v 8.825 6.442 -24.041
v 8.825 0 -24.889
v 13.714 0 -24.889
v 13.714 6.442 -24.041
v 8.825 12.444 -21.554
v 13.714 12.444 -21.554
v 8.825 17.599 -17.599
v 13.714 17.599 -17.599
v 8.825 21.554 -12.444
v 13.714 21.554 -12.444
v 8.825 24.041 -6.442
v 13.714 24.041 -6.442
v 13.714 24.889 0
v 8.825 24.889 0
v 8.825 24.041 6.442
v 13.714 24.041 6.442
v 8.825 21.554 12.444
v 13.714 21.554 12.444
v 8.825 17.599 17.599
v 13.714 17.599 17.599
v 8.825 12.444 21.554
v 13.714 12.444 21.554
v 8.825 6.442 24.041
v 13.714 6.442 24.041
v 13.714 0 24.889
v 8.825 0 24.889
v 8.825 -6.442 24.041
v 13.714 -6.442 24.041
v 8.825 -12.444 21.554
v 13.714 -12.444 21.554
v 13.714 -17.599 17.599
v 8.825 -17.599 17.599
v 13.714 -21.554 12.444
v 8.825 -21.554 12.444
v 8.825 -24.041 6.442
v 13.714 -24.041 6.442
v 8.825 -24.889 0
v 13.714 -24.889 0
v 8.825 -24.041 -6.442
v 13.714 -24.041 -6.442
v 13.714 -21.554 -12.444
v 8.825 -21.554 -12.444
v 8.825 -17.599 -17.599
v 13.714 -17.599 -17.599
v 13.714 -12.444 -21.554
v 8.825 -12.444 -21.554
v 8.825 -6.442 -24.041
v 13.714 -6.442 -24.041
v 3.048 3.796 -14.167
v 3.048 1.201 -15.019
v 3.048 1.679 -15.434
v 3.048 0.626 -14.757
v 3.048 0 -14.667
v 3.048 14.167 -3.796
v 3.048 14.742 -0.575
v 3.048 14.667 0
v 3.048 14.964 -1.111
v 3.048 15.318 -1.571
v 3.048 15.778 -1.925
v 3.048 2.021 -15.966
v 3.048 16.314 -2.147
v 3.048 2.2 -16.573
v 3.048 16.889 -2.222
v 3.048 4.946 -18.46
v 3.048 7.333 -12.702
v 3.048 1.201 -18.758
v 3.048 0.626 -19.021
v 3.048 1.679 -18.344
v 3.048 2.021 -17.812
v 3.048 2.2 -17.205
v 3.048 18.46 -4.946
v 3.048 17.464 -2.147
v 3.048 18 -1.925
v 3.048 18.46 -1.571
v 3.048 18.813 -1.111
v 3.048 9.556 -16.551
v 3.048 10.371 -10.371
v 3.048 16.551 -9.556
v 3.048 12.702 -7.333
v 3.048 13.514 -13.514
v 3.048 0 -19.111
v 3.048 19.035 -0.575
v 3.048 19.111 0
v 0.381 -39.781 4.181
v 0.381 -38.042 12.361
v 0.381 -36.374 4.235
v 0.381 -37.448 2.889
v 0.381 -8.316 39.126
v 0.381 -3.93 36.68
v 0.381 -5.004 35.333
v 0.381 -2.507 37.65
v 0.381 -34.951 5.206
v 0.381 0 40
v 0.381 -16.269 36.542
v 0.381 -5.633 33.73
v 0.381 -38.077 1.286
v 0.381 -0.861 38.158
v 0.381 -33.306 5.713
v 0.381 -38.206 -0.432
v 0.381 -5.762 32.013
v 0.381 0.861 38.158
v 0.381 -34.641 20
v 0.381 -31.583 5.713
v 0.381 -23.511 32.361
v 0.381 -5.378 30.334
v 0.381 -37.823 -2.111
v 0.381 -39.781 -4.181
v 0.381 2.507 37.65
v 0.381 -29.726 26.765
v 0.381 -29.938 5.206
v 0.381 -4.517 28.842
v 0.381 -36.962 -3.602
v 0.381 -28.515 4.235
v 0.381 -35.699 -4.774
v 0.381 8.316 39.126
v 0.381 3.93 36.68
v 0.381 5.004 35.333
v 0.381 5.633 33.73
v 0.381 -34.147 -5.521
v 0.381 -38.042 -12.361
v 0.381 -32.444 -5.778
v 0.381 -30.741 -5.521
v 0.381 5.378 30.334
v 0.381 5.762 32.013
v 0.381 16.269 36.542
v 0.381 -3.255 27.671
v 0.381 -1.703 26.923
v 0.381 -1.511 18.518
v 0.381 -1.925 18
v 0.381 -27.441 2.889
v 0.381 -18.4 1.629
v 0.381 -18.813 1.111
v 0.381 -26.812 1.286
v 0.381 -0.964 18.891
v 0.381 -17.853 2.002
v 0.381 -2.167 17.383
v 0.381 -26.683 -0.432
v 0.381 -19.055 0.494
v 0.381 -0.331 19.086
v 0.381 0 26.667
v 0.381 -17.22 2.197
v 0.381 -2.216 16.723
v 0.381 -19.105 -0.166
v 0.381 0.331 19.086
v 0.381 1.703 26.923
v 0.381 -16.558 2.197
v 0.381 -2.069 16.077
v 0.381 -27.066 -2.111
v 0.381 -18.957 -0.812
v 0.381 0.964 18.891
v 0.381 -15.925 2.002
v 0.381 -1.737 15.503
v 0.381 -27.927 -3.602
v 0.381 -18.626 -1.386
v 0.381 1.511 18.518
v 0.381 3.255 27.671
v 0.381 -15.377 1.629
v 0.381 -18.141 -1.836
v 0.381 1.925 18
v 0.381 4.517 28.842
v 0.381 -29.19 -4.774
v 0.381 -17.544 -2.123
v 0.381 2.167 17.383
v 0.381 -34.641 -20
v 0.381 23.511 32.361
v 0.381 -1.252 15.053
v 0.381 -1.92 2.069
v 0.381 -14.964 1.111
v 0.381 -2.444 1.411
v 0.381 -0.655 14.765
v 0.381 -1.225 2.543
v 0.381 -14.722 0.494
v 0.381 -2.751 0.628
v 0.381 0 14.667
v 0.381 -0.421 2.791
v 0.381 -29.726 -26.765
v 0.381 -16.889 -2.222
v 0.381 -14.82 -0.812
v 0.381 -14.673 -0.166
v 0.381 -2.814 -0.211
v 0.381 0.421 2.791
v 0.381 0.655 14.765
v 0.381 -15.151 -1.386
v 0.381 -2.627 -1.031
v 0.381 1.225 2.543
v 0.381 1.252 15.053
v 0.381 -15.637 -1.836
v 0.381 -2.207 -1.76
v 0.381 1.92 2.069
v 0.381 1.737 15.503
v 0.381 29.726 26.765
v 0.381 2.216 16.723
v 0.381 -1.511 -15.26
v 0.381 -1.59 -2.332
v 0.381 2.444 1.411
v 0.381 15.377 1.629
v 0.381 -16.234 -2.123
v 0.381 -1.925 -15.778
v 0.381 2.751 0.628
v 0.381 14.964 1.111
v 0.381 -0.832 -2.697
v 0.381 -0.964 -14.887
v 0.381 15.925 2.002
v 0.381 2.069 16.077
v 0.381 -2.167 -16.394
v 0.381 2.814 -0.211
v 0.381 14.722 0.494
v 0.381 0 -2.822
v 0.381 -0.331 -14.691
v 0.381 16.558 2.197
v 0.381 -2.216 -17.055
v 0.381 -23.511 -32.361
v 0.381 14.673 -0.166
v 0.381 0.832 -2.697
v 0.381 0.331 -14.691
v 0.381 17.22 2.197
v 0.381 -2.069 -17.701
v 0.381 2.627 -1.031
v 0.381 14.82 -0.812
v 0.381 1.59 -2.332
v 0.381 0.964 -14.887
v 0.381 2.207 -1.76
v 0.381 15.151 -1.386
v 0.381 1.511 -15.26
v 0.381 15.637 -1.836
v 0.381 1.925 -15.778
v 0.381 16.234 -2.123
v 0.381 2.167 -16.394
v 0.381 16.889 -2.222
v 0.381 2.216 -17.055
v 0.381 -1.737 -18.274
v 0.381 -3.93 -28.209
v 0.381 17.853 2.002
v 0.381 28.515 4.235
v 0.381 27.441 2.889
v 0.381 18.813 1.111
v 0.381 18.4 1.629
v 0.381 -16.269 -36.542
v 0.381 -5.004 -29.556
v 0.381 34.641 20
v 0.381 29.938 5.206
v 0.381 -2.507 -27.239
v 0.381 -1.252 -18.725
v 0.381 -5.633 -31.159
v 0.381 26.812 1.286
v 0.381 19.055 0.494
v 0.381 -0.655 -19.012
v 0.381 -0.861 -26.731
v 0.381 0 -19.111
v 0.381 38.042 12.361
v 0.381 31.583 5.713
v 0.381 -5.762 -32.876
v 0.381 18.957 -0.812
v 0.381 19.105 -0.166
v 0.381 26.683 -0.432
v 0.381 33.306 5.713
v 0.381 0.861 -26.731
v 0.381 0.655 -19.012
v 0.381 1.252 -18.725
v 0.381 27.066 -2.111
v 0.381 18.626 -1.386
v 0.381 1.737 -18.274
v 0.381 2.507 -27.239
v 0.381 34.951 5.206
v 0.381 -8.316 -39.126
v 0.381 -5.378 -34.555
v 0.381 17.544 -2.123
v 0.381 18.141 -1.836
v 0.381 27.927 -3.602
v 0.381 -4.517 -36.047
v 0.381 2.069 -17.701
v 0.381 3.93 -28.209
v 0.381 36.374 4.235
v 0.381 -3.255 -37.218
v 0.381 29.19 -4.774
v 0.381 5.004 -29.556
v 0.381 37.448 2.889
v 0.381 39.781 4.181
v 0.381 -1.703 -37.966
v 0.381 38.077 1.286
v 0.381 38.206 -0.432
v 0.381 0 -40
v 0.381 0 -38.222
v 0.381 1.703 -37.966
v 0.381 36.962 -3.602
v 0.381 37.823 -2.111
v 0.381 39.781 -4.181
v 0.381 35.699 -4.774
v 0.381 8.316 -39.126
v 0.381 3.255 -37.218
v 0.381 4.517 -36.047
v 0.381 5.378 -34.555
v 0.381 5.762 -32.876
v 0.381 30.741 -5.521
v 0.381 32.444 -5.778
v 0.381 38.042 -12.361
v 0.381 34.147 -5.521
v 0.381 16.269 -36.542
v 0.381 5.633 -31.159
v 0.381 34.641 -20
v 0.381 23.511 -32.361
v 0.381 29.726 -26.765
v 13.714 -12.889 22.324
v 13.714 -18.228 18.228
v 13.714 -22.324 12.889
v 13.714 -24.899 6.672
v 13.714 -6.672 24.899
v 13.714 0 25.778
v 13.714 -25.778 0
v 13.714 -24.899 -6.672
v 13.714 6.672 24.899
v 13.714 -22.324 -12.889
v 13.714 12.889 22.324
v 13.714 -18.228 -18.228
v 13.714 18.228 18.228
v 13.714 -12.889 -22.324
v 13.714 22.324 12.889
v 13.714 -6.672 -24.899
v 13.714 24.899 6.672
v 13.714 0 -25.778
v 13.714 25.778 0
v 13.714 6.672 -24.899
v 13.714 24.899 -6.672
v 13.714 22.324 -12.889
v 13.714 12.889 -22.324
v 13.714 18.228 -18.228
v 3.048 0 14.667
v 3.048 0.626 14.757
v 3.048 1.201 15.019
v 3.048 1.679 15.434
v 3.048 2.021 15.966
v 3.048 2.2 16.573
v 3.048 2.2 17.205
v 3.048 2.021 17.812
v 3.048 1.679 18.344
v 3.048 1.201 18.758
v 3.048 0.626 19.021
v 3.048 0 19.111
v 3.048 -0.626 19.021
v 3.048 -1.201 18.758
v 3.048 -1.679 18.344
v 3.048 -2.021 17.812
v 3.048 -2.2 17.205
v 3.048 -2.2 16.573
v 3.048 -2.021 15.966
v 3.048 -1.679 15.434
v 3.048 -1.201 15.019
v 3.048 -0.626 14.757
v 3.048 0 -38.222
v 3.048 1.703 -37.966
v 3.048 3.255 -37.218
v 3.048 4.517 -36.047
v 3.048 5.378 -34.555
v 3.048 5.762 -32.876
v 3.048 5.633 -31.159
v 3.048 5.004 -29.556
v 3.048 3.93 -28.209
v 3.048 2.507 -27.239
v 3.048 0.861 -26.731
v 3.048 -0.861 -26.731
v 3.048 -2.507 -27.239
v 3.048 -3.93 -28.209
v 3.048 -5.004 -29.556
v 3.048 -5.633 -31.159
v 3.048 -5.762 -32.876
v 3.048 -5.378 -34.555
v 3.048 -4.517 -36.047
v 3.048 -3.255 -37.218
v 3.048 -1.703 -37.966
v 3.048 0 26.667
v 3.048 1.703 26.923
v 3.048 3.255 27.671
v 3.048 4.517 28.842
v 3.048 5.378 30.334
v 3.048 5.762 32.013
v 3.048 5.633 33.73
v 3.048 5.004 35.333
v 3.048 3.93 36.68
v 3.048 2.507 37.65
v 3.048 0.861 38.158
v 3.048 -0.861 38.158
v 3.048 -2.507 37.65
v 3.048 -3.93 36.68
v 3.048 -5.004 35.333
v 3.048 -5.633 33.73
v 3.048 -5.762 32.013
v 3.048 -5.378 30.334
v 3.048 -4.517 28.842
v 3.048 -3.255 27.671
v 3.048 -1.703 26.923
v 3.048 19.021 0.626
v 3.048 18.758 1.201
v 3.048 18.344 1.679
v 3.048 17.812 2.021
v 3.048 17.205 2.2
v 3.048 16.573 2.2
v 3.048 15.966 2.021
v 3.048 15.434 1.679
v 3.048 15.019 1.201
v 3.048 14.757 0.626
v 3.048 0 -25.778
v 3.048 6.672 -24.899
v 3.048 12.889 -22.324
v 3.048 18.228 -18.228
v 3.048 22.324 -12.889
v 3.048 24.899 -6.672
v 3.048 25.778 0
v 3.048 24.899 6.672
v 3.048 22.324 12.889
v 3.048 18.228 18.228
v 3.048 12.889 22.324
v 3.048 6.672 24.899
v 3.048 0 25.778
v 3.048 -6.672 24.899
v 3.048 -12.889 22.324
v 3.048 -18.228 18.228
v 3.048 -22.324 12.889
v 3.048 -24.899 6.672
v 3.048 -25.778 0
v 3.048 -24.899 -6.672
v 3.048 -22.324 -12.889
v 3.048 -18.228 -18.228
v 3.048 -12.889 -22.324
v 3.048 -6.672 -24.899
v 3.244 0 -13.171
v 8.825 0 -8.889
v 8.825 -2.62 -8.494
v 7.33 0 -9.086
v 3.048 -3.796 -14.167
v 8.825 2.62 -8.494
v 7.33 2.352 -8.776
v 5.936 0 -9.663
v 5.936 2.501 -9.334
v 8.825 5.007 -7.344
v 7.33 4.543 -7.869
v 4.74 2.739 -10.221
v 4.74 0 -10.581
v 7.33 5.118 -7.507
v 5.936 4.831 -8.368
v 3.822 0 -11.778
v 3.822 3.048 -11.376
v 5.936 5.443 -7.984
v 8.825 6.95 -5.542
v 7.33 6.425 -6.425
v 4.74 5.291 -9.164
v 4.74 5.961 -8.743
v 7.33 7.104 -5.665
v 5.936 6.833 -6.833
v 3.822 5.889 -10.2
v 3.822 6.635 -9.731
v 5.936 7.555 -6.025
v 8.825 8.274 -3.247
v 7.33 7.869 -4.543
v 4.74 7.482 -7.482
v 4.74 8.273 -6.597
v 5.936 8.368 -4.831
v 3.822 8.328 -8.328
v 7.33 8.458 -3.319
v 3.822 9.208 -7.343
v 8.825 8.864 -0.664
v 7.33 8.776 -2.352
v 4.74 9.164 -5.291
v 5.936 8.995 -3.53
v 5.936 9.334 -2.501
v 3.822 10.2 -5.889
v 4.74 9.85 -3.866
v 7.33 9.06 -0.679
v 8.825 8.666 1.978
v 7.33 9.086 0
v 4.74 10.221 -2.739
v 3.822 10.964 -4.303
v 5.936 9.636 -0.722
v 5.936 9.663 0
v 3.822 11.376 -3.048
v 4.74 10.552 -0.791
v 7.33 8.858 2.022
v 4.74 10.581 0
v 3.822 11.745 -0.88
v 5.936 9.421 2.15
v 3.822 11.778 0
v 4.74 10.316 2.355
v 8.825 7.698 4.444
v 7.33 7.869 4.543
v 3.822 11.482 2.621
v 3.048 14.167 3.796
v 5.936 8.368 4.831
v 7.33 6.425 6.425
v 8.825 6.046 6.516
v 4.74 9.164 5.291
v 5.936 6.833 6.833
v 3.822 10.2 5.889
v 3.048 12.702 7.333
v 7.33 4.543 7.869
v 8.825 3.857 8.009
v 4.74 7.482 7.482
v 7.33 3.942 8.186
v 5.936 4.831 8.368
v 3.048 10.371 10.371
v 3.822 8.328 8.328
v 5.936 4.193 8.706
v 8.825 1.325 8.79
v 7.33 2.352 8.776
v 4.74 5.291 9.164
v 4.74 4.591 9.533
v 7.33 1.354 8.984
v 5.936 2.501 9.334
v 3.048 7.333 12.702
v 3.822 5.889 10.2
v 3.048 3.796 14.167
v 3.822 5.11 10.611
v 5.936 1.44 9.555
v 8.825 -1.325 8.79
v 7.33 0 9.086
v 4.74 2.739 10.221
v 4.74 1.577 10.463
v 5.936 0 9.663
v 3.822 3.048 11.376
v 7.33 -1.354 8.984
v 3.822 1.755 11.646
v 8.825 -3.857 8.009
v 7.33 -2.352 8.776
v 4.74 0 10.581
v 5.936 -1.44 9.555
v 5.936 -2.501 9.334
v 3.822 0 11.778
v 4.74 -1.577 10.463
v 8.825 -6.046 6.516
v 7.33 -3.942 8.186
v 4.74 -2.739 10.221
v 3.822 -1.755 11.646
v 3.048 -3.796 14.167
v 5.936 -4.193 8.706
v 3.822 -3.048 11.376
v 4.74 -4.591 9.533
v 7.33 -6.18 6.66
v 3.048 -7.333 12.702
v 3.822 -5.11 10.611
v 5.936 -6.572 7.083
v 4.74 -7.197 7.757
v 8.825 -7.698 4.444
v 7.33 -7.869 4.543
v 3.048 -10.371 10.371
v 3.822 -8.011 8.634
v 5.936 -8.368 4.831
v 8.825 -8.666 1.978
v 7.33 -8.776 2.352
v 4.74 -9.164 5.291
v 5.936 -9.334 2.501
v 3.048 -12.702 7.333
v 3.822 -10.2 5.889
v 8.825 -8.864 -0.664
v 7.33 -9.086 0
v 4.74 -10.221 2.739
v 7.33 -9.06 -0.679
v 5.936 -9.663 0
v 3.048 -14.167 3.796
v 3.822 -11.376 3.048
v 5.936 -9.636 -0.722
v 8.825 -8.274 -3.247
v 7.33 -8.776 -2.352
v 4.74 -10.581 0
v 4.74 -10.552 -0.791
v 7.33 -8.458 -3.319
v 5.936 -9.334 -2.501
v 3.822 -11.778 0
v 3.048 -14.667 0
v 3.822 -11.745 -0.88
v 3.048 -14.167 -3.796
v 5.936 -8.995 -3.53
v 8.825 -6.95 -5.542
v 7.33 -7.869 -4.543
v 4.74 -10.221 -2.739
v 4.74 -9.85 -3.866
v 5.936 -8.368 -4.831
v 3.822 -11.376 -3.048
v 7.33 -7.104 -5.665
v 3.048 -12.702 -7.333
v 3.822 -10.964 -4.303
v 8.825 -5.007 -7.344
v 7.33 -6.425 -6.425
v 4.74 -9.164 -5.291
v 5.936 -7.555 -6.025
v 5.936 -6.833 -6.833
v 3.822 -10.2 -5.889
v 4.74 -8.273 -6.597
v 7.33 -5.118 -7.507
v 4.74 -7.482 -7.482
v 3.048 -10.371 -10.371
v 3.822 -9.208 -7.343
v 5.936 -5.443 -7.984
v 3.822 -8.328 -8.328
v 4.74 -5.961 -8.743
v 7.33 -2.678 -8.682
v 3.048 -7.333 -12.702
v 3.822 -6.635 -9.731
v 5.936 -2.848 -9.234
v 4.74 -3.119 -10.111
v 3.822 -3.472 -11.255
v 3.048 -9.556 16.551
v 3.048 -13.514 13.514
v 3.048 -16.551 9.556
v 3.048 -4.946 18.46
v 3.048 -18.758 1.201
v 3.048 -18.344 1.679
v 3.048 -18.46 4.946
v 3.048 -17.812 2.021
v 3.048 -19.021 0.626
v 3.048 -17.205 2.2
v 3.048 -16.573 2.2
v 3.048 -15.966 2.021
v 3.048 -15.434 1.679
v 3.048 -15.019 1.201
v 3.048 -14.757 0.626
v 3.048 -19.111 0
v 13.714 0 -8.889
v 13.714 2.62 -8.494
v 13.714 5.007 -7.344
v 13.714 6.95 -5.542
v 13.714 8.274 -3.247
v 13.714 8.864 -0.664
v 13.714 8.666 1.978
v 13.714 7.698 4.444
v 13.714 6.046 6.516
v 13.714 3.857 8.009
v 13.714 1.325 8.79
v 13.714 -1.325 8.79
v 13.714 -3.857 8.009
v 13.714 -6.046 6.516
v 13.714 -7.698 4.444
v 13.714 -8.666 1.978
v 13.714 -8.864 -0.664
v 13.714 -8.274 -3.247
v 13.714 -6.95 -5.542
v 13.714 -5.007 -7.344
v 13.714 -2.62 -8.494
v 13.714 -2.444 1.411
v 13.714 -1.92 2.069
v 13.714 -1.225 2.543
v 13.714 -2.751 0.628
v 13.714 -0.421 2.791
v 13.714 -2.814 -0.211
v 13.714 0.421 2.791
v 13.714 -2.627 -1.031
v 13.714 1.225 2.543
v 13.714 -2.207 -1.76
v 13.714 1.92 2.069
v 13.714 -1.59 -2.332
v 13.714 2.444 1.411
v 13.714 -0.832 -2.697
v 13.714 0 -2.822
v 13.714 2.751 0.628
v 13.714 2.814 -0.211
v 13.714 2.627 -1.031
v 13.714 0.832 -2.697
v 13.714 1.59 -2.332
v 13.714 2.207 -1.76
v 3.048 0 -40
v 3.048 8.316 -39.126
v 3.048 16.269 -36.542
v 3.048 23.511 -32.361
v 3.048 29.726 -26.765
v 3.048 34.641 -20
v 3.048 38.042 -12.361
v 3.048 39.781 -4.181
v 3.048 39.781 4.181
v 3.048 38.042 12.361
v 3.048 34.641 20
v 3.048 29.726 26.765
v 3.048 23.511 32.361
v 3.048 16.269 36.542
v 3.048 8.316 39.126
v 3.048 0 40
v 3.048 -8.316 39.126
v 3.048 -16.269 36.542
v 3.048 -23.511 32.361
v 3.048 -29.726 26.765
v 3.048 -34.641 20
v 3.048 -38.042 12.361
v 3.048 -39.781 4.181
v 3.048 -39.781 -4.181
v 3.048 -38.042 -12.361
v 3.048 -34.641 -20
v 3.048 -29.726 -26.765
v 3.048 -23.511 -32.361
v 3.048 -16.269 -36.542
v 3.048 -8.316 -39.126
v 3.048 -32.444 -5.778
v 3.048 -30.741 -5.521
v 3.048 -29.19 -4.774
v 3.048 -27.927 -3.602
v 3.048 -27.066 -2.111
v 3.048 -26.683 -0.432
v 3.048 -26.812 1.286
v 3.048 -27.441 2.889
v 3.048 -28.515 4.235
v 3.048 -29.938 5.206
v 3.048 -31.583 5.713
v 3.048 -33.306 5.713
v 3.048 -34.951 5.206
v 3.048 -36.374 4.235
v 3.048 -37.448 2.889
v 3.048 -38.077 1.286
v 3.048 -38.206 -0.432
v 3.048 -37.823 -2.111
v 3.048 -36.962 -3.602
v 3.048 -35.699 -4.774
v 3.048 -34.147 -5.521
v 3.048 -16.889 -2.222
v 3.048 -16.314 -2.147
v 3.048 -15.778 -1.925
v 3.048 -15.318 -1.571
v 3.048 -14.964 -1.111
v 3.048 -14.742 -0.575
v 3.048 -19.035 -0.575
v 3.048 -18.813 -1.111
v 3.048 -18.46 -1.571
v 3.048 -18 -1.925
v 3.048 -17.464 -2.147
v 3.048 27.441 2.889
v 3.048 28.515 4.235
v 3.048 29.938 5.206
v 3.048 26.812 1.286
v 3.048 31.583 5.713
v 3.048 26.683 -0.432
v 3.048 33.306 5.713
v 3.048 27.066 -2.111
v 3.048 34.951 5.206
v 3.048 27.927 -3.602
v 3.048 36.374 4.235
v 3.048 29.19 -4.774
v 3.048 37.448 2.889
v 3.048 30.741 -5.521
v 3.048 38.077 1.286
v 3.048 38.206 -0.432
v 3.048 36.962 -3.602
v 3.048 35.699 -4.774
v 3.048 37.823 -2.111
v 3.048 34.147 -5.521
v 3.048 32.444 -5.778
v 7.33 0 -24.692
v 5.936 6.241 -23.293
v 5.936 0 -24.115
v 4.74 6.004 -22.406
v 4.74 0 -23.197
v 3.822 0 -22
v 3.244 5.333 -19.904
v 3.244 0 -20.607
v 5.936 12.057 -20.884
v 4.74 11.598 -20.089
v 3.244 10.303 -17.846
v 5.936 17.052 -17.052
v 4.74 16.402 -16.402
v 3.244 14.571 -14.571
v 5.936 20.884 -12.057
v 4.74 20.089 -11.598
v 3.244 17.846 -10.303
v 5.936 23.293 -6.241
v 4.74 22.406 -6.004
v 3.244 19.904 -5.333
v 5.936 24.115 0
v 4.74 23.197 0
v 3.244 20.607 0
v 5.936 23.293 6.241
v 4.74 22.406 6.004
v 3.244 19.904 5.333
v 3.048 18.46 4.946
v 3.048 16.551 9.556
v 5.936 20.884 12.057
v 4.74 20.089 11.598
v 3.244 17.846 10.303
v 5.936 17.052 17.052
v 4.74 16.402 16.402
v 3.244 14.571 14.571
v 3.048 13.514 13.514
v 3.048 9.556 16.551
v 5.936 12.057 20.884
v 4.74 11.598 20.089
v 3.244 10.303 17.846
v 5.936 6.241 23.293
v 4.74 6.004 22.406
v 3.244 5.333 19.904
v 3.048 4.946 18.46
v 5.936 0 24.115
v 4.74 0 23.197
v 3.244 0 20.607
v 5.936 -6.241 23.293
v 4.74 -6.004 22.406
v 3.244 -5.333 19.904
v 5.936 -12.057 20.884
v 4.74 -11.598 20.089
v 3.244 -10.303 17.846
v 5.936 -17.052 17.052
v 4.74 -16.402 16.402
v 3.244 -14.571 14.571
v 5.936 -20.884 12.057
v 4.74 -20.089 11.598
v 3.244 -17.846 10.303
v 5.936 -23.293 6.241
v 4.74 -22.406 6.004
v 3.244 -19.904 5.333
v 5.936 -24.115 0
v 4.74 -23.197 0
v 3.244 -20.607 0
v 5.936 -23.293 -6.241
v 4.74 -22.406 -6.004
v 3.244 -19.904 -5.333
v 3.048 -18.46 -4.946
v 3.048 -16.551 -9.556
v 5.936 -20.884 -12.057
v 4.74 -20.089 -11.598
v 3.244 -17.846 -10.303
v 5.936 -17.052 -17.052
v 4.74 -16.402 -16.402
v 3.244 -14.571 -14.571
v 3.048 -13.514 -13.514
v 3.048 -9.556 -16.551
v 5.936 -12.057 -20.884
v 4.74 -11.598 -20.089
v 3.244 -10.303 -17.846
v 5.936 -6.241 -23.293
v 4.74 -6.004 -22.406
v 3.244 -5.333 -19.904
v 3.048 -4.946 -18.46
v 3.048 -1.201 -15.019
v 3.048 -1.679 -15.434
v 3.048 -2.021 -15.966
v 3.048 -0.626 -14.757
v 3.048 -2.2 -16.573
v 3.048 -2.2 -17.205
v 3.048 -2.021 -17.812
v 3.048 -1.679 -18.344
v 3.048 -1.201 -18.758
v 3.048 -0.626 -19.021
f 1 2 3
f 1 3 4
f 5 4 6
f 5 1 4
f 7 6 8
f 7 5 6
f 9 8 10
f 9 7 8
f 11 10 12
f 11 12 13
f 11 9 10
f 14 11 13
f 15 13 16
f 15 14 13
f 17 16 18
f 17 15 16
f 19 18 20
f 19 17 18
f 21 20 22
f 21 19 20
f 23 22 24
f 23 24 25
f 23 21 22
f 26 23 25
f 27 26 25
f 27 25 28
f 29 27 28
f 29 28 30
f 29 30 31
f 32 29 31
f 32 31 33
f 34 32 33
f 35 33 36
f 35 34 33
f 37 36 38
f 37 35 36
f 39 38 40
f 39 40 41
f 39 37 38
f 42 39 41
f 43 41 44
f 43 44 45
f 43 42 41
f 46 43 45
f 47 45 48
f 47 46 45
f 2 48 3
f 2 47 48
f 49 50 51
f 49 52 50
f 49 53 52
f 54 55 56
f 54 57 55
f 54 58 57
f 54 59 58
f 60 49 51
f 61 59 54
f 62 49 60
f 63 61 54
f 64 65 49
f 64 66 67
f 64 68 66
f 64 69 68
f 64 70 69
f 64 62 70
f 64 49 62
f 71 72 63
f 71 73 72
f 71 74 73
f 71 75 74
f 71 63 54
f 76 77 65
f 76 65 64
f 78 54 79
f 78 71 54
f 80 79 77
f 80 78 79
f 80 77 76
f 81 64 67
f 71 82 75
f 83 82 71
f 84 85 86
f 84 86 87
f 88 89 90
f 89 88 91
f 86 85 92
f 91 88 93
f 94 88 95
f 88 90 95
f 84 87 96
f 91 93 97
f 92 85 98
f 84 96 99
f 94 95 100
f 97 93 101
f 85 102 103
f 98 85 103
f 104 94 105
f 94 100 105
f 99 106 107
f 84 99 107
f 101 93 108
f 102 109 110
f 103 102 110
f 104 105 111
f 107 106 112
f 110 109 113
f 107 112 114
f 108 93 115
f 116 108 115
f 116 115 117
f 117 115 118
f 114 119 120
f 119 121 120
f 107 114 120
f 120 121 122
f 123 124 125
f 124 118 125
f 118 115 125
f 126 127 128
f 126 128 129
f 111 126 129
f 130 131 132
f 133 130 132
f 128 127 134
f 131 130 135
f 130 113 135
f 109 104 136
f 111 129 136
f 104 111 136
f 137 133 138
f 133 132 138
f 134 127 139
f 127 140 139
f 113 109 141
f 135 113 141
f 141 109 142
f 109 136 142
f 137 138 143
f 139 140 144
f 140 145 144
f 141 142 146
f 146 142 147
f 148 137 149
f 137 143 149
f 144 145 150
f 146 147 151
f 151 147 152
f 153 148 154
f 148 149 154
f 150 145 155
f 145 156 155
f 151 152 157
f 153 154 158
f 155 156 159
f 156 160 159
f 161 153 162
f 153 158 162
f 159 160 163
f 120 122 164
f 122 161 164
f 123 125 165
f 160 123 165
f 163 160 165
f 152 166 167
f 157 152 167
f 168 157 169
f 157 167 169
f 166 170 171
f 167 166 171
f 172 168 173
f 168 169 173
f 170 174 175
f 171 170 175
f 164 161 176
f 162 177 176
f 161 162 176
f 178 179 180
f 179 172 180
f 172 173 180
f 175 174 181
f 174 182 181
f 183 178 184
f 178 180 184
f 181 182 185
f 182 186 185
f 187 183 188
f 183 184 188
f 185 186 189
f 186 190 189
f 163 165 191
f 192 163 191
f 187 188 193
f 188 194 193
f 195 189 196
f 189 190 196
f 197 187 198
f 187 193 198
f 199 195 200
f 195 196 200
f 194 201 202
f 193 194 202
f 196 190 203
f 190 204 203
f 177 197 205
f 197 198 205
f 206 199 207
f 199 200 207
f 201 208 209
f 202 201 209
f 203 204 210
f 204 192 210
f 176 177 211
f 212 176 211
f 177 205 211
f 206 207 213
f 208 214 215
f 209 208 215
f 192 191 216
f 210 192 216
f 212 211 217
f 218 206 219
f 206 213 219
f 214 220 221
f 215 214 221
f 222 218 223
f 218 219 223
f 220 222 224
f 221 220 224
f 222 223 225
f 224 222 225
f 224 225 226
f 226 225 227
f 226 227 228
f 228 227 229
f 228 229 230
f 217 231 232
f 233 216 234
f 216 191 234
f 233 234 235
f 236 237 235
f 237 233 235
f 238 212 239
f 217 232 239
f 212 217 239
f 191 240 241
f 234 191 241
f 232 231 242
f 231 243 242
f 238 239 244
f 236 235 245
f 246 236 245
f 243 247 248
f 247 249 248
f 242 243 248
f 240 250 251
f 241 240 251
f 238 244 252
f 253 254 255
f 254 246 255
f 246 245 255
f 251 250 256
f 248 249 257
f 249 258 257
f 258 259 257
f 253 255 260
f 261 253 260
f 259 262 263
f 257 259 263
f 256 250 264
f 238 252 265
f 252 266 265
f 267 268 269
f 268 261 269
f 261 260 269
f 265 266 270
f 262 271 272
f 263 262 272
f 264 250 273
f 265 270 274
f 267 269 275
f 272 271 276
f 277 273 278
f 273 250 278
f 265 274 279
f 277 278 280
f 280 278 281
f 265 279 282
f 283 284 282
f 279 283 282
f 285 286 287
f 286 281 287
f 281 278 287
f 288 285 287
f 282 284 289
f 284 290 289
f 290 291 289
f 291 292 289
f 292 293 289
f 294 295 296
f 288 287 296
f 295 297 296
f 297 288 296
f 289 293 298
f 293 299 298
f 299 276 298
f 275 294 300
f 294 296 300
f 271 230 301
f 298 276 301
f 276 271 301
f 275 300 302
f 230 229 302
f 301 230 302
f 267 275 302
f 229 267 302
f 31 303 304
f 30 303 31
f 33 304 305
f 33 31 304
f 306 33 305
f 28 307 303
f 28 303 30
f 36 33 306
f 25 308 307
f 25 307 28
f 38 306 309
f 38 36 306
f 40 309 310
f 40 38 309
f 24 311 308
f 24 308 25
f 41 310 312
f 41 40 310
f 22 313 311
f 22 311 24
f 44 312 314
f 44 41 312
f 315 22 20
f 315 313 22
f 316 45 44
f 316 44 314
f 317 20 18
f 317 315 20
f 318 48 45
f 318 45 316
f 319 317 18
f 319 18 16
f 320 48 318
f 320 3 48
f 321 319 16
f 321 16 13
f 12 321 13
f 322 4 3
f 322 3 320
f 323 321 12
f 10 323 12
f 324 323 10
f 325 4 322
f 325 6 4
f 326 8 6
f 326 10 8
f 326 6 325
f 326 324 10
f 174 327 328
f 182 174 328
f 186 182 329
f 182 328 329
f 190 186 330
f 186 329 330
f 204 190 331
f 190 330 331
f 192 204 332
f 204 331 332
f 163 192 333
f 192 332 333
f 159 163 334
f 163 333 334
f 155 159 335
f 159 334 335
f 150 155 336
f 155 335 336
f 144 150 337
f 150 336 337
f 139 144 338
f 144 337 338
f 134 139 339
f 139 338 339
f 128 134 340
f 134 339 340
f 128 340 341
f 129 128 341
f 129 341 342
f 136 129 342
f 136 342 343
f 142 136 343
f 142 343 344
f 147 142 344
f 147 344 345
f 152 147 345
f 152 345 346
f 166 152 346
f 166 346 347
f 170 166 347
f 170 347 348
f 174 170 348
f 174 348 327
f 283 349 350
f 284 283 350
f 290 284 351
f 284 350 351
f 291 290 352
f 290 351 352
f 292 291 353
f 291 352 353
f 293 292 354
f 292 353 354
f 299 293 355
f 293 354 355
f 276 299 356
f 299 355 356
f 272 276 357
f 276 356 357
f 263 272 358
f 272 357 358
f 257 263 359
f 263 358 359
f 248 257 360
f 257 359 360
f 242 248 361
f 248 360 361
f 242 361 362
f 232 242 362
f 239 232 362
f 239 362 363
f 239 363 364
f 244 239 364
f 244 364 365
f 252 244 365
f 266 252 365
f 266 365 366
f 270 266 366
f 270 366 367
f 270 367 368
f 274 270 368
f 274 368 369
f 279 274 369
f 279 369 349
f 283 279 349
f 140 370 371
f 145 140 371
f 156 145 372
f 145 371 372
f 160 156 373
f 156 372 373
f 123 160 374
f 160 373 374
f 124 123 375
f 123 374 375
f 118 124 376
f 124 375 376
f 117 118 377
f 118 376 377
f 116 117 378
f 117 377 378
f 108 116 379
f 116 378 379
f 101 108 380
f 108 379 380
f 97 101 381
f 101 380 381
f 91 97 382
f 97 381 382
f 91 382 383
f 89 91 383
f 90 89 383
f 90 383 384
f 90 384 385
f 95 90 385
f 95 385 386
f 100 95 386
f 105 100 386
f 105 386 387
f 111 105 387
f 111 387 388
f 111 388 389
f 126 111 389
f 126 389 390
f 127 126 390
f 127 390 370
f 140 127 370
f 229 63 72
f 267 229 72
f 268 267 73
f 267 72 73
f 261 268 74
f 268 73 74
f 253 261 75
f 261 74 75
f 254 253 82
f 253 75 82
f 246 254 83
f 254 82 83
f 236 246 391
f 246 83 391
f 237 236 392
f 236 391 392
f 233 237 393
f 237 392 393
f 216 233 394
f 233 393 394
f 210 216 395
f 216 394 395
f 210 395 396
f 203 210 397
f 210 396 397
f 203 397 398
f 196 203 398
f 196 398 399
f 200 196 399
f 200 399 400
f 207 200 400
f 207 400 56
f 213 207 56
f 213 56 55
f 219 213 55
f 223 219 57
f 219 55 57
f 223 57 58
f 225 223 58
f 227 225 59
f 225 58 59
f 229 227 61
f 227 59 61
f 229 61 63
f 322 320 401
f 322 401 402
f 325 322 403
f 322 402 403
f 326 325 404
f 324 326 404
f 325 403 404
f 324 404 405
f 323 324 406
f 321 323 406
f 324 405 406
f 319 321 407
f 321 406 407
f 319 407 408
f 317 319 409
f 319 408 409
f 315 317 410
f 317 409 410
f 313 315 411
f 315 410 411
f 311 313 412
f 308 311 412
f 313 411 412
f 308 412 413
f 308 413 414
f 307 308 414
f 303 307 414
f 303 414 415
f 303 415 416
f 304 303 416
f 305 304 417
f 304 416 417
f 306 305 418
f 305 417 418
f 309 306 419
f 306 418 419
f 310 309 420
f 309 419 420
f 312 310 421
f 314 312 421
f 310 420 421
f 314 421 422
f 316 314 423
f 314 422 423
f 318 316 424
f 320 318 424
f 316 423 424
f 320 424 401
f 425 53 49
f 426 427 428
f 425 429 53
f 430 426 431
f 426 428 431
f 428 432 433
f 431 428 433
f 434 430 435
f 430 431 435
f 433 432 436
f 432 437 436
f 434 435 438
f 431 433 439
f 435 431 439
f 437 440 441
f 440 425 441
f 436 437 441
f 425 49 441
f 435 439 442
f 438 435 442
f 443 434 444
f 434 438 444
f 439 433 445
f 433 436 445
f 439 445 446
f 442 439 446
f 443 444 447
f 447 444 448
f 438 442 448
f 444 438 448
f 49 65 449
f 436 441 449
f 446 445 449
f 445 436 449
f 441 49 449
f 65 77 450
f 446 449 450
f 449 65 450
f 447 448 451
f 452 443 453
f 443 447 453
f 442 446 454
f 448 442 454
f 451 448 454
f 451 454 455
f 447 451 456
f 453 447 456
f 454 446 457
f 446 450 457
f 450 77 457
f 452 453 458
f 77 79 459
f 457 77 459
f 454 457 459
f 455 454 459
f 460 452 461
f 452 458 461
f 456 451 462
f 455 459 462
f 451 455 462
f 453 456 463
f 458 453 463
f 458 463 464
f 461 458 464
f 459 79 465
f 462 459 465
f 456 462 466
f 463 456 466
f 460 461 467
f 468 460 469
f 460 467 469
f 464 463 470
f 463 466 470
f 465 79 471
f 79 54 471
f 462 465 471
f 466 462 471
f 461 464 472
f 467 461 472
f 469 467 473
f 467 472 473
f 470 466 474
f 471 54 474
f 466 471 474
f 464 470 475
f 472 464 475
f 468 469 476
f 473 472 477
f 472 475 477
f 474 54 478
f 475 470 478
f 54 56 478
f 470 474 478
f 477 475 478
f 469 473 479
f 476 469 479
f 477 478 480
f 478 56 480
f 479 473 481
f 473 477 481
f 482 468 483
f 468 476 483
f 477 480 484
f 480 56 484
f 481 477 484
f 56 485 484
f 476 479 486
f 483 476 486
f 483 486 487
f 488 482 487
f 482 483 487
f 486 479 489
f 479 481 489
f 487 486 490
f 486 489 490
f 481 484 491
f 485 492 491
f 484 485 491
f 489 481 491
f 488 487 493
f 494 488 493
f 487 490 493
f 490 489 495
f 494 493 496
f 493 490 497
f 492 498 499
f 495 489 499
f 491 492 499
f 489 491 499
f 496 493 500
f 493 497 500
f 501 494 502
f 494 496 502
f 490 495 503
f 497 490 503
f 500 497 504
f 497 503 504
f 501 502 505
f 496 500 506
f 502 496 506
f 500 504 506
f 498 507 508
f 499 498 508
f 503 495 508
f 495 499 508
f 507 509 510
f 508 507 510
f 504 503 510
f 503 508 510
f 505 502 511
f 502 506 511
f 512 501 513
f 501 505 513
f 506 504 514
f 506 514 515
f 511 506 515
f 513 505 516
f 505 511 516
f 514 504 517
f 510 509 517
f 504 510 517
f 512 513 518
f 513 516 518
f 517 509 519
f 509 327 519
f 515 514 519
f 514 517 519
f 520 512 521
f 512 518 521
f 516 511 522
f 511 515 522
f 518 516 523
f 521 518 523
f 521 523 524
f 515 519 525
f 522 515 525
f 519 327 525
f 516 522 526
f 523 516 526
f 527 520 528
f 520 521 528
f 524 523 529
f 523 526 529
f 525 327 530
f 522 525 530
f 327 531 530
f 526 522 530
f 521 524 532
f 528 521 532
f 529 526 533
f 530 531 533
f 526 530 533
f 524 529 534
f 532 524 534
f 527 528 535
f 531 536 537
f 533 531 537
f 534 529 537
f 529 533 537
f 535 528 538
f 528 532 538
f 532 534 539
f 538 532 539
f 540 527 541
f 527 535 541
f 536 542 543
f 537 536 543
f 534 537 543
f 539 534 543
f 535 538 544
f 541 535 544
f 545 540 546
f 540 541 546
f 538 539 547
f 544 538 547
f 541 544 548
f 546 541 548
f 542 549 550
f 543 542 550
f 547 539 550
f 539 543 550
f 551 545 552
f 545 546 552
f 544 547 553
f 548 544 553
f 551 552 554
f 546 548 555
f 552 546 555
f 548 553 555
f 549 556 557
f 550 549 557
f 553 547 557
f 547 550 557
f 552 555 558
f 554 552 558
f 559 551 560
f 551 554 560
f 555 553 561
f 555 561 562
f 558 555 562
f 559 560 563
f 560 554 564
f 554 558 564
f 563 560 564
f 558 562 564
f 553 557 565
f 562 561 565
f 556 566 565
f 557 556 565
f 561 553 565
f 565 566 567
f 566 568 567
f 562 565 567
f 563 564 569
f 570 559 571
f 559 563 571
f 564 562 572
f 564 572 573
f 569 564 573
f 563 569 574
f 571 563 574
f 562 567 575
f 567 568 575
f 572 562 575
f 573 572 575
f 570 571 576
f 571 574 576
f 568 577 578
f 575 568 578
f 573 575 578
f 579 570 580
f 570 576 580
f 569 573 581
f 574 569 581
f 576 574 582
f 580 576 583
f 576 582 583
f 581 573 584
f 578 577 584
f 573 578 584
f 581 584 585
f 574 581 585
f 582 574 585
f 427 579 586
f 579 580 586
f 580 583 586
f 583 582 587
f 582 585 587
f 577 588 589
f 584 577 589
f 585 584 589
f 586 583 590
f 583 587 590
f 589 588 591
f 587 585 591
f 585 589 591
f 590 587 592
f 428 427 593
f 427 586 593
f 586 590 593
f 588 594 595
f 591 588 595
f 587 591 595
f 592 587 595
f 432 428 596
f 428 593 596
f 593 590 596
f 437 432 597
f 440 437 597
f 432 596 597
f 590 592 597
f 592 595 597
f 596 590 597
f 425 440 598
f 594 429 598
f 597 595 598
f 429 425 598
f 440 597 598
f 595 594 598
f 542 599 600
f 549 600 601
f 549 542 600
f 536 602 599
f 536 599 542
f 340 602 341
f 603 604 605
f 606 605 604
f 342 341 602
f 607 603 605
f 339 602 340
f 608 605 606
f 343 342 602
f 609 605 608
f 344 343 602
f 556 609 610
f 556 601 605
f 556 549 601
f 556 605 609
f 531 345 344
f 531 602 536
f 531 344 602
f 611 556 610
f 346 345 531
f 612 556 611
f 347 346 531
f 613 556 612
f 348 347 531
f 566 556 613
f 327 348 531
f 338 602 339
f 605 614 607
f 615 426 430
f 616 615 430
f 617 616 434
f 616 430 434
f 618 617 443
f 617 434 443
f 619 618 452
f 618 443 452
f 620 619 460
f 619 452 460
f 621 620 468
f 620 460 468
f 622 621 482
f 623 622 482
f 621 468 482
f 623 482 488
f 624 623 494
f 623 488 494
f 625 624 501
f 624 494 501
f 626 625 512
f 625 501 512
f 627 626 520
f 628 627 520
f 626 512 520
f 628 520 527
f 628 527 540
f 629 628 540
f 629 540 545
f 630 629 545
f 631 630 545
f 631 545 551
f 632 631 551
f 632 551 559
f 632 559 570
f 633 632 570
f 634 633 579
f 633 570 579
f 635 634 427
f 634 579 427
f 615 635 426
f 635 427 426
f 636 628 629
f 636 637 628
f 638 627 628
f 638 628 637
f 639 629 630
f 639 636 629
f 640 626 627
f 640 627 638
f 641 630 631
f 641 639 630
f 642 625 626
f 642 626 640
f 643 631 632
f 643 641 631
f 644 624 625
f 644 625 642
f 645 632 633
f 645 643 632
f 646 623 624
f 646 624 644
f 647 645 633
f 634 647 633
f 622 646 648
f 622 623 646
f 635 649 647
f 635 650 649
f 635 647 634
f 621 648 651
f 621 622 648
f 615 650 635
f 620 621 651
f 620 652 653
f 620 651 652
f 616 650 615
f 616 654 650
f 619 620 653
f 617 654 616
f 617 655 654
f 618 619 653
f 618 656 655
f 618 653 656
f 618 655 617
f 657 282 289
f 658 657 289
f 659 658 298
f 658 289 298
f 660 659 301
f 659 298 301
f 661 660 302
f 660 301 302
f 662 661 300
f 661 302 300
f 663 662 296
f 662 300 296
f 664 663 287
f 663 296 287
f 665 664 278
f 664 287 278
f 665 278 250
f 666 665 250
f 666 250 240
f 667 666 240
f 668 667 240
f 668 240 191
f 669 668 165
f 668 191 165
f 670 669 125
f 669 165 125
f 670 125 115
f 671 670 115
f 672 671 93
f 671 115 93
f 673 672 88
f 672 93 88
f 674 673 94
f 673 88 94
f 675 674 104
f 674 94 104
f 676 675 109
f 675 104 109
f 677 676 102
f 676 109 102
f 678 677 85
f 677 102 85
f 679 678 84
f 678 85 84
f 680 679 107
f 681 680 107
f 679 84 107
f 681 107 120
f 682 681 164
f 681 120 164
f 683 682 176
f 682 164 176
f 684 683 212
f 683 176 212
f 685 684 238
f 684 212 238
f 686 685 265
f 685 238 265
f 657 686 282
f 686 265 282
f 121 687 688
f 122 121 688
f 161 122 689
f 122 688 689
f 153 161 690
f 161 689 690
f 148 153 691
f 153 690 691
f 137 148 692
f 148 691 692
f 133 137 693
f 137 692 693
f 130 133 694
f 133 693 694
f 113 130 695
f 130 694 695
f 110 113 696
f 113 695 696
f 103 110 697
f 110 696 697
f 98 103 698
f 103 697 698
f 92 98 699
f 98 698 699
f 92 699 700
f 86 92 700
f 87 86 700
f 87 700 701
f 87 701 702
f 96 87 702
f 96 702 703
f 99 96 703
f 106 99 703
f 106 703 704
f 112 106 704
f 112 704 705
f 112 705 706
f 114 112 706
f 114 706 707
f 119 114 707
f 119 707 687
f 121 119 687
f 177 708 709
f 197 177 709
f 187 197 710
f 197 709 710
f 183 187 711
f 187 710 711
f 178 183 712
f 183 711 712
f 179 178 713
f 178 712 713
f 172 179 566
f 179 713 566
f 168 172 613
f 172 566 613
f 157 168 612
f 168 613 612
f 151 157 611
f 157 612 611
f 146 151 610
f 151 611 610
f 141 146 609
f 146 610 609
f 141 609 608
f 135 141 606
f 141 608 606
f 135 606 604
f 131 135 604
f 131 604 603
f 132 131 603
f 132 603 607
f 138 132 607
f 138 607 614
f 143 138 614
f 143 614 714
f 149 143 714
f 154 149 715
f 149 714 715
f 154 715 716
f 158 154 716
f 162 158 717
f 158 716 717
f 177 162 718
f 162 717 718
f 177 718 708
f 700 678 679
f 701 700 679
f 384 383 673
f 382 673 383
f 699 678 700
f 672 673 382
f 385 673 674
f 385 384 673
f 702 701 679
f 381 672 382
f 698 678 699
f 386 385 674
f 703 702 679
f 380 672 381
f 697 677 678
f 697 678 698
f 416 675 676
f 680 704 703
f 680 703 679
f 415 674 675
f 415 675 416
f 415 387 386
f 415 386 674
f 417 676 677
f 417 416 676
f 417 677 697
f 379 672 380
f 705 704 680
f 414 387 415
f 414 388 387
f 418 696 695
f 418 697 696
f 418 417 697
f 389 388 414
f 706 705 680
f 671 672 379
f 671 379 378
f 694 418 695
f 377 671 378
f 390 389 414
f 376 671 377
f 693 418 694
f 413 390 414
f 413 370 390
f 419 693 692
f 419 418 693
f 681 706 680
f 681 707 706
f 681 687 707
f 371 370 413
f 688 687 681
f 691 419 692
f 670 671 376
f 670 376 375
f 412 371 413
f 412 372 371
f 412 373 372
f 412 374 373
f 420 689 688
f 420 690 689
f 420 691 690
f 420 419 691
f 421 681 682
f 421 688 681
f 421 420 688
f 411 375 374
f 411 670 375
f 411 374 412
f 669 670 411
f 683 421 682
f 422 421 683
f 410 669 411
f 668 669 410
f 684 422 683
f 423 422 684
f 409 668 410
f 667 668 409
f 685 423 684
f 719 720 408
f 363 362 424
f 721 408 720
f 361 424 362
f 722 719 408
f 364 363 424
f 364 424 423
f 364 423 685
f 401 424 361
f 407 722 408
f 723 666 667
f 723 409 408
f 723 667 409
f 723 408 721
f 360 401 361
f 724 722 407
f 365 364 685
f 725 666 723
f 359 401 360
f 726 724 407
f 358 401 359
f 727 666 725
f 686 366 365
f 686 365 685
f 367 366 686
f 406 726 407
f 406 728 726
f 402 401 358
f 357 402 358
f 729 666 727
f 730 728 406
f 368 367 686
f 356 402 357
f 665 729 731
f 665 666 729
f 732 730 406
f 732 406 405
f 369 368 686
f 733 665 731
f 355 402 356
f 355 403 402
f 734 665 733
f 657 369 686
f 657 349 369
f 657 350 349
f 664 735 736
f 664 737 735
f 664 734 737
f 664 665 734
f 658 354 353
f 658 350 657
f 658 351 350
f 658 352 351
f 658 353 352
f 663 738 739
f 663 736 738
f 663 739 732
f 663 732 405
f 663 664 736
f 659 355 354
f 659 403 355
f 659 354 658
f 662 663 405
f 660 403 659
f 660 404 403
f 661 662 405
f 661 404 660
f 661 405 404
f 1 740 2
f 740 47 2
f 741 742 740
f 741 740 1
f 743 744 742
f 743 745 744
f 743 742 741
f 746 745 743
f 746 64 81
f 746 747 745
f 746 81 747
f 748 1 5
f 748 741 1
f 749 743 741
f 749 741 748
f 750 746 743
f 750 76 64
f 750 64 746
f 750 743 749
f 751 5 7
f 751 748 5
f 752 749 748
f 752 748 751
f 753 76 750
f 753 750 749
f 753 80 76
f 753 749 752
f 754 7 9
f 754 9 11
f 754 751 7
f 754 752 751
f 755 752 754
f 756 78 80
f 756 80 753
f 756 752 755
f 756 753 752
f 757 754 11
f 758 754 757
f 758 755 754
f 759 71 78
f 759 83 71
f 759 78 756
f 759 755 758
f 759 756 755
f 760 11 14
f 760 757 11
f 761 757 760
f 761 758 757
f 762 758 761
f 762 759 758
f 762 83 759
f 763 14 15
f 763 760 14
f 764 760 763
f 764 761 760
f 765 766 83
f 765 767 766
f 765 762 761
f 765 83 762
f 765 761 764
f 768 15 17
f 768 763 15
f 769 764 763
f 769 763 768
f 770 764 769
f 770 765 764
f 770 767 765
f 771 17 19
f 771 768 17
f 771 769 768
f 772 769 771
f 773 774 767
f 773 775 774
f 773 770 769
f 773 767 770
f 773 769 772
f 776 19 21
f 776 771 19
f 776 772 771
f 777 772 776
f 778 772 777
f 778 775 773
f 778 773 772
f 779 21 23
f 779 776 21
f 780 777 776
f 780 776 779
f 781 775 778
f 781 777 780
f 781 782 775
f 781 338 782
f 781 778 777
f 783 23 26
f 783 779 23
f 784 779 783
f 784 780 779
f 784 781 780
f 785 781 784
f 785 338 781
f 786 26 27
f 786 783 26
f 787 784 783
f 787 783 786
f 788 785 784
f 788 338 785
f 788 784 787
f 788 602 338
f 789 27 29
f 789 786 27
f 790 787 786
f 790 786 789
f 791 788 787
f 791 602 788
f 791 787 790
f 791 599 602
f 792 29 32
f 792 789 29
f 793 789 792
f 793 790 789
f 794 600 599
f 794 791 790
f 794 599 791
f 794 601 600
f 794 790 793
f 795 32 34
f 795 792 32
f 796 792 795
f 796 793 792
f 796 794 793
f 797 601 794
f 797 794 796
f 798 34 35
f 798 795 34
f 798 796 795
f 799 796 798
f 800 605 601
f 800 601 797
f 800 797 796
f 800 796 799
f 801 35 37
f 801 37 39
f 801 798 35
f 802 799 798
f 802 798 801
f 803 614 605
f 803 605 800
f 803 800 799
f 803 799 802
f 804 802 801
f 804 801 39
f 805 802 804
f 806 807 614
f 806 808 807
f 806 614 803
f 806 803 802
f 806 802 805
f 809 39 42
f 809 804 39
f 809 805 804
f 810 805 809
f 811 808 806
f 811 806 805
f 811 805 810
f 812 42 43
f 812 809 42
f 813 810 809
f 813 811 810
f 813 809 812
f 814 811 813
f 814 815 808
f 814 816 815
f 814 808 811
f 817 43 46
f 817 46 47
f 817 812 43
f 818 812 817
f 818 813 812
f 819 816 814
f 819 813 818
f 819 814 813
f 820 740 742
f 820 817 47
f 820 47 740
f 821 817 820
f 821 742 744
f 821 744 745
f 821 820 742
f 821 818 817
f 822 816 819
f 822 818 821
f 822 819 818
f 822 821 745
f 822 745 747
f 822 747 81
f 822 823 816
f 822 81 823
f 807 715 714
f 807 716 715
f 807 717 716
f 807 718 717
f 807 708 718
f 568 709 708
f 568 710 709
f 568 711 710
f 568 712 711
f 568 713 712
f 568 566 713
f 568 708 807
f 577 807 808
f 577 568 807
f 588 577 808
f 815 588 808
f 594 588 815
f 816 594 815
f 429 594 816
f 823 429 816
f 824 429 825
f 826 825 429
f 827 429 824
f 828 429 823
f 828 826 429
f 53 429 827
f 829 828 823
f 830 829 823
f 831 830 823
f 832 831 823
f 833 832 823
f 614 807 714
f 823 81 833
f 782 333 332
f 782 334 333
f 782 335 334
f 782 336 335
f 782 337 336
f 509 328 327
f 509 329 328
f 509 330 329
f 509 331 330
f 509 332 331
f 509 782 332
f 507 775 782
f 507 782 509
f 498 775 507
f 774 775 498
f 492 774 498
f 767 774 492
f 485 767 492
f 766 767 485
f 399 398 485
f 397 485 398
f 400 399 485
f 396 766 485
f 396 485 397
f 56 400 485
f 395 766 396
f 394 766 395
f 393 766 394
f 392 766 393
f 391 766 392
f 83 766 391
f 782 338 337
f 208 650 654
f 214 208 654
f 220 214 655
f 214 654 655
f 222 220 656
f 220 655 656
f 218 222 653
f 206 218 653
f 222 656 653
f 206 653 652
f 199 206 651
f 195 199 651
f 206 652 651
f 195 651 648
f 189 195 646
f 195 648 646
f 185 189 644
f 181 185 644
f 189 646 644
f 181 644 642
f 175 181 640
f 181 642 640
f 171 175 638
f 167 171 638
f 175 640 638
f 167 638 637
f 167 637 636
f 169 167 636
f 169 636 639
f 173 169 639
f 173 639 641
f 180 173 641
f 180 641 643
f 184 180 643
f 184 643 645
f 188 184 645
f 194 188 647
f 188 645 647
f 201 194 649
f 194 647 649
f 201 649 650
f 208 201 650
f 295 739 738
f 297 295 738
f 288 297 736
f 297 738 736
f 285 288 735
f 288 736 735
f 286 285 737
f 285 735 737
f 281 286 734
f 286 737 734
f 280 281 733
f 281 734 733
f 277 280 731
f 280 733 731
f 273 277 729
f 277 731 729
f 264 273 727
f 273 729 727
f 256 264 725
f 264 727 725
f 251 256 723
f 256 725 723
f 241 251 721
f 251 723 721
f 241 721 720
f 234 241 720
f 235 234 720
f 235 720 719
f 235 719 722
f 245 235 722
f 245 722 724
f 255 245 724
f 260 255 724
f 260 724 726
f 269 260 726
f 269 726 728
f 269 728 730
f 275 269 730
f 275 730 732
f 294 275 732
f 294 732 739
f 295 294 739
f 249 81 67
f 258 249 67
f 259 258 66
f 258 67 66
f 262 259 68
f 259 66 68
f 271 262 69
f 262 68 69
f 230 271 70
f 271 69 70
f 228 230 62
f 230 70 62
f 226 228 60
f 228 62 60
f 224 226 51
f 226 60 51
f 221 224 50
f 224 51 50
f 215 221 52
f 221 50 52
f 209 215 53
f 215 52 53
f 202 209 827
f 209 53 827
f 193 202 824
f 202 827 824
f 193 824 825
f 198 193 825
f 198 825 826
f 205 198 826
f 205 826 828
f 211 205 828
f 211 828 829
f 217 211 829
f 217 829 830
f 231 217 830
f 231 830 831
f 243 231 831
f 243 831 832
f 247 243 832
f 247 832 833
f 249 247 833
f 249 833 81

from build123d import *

# Parameters (mm, degrees)
SPROCKET_R                   = 45
ESTRUSIONE_ESTRUSIONE2_DEPTH = 3
SCHIZZO4_R                   = 10
ESTRUSIONE_ESTRUSIONE4_DEPTH = 12
SCHIZZO5_R                   = 29
SCHIZZO5_R_2                 = 28
ESTRUSIONE_ESTRUSIONE5_DEPTH = 12
SCHIZZO6_R                   = 3.175
TAGLIO_ESTRUSIONE1_DEPTH     = 15
RACCORDO1_R                  = 6.5
SCHIZZO7_R                   = 6.5
SCHIZZO7_R_2                 = 2.5
TAGLIO_ESTRUSIONE2_DEPTH     = 4
SCALE1_SCALE                 = 0.888888889


with BuildPart() as part:
    # Sprocket → Estrusione-Estrusione2 (new body)
    with BuildSketch(Plane(origin=(0, 0, 0), x_dir=(0, 0, -1), z_dir=(1, 0, 0))):
        Circle(SPROCKET_R)
    extrude(amount=ESTRUSIONE_ESTRUSIONE2_DEPTH)

    # Schizzo4 → Estrusione-Estrusione4 (add)
    with BuildSketch(Plane(origin=(3, 0, 0), x_dir=(0, 0, -1), z_dir=(1, 0, 0))):
        Circle(SCHIZZO4_R)
    extrude(amount=ESTRUSIONE_ESTRUSIONE4_DEPTH)

    # Schizzo5 → Estrusione-Estrusione5 (add)
    with BuildSketch(Plane(origin=(3, 0, 0), x_dir=(0, 0, -1), z_dir=(1, 0, 0))):
        Circle(SCHIZZO5_R)
        Circle(SCHIZZO5_R_2, mode=Mode.SUBTRACT)
    extrude(amount=ESTRUSIONE_ESTRUSIONE5_DEPTH)

    # Schizzo6 → Taglio-Estrusione1 (cut)
    with BuildSketch(Plane(origin=(15, 0, 0), x_dir=(0, 0, -1), z_dir=(1, 0, 0))):
        Circle(SCHIZZO6_R)
    extrude(amount=-TAGLIO_ESTRUSIONE1_DEPTH, mode=Mode.SUBTRACT)

    # Raccordo1
    raccordo1_edges = [part.edges().sort_by_distance(p)[0] for p in [
        (3, 0, 10),
        (3, 0, 28),
    ]]
    fillet(raccordo1_edges, radius=RACCORDO1_R)

    # Schizzo7 → Taglio-Estrusione2 (cut, through all)
    with BuildSketch(Plane(origin=(3, 0, 0), x_dir=(0, 0, -1), z_dir=(1, 0, 0))):
        with Locations((0, 36.5)):
            Circle(SCHIZZO7_R)
        with Locations((36.5, 0)):
            Circle(SCHIZZO7_R)
        with Locations((0, -36.5)):
            Circle(SCHIZZO7_R)
        with Locations((-36.5, 0)):
            Circle(SCHIZZO7_R)
        with Locations((0, 19)):
            Circle(SCHIZZO7_R_2)
        with Locations((19, 0)):
            Circle(SCHIZZO7_R_2)
        with Locations((0, -19)):
            Circle(SCHIZZO7_R_2)
        with Locations((-19, 0)):
            Circle(SCHIZZO7_R_2)
    extrude(amount=-TAGLIO_ESTRUSIONE2_DEPTH, mode=Mode.SUBTRACT)


with BuildPart() as part_1:
    # Scale1: scaled about (3.427617089, 0, 0)
    add(part.part.scale(SCALE1_SCALE).moved(Location((0.380846343, 0, 0))))


solid = part_1.part
